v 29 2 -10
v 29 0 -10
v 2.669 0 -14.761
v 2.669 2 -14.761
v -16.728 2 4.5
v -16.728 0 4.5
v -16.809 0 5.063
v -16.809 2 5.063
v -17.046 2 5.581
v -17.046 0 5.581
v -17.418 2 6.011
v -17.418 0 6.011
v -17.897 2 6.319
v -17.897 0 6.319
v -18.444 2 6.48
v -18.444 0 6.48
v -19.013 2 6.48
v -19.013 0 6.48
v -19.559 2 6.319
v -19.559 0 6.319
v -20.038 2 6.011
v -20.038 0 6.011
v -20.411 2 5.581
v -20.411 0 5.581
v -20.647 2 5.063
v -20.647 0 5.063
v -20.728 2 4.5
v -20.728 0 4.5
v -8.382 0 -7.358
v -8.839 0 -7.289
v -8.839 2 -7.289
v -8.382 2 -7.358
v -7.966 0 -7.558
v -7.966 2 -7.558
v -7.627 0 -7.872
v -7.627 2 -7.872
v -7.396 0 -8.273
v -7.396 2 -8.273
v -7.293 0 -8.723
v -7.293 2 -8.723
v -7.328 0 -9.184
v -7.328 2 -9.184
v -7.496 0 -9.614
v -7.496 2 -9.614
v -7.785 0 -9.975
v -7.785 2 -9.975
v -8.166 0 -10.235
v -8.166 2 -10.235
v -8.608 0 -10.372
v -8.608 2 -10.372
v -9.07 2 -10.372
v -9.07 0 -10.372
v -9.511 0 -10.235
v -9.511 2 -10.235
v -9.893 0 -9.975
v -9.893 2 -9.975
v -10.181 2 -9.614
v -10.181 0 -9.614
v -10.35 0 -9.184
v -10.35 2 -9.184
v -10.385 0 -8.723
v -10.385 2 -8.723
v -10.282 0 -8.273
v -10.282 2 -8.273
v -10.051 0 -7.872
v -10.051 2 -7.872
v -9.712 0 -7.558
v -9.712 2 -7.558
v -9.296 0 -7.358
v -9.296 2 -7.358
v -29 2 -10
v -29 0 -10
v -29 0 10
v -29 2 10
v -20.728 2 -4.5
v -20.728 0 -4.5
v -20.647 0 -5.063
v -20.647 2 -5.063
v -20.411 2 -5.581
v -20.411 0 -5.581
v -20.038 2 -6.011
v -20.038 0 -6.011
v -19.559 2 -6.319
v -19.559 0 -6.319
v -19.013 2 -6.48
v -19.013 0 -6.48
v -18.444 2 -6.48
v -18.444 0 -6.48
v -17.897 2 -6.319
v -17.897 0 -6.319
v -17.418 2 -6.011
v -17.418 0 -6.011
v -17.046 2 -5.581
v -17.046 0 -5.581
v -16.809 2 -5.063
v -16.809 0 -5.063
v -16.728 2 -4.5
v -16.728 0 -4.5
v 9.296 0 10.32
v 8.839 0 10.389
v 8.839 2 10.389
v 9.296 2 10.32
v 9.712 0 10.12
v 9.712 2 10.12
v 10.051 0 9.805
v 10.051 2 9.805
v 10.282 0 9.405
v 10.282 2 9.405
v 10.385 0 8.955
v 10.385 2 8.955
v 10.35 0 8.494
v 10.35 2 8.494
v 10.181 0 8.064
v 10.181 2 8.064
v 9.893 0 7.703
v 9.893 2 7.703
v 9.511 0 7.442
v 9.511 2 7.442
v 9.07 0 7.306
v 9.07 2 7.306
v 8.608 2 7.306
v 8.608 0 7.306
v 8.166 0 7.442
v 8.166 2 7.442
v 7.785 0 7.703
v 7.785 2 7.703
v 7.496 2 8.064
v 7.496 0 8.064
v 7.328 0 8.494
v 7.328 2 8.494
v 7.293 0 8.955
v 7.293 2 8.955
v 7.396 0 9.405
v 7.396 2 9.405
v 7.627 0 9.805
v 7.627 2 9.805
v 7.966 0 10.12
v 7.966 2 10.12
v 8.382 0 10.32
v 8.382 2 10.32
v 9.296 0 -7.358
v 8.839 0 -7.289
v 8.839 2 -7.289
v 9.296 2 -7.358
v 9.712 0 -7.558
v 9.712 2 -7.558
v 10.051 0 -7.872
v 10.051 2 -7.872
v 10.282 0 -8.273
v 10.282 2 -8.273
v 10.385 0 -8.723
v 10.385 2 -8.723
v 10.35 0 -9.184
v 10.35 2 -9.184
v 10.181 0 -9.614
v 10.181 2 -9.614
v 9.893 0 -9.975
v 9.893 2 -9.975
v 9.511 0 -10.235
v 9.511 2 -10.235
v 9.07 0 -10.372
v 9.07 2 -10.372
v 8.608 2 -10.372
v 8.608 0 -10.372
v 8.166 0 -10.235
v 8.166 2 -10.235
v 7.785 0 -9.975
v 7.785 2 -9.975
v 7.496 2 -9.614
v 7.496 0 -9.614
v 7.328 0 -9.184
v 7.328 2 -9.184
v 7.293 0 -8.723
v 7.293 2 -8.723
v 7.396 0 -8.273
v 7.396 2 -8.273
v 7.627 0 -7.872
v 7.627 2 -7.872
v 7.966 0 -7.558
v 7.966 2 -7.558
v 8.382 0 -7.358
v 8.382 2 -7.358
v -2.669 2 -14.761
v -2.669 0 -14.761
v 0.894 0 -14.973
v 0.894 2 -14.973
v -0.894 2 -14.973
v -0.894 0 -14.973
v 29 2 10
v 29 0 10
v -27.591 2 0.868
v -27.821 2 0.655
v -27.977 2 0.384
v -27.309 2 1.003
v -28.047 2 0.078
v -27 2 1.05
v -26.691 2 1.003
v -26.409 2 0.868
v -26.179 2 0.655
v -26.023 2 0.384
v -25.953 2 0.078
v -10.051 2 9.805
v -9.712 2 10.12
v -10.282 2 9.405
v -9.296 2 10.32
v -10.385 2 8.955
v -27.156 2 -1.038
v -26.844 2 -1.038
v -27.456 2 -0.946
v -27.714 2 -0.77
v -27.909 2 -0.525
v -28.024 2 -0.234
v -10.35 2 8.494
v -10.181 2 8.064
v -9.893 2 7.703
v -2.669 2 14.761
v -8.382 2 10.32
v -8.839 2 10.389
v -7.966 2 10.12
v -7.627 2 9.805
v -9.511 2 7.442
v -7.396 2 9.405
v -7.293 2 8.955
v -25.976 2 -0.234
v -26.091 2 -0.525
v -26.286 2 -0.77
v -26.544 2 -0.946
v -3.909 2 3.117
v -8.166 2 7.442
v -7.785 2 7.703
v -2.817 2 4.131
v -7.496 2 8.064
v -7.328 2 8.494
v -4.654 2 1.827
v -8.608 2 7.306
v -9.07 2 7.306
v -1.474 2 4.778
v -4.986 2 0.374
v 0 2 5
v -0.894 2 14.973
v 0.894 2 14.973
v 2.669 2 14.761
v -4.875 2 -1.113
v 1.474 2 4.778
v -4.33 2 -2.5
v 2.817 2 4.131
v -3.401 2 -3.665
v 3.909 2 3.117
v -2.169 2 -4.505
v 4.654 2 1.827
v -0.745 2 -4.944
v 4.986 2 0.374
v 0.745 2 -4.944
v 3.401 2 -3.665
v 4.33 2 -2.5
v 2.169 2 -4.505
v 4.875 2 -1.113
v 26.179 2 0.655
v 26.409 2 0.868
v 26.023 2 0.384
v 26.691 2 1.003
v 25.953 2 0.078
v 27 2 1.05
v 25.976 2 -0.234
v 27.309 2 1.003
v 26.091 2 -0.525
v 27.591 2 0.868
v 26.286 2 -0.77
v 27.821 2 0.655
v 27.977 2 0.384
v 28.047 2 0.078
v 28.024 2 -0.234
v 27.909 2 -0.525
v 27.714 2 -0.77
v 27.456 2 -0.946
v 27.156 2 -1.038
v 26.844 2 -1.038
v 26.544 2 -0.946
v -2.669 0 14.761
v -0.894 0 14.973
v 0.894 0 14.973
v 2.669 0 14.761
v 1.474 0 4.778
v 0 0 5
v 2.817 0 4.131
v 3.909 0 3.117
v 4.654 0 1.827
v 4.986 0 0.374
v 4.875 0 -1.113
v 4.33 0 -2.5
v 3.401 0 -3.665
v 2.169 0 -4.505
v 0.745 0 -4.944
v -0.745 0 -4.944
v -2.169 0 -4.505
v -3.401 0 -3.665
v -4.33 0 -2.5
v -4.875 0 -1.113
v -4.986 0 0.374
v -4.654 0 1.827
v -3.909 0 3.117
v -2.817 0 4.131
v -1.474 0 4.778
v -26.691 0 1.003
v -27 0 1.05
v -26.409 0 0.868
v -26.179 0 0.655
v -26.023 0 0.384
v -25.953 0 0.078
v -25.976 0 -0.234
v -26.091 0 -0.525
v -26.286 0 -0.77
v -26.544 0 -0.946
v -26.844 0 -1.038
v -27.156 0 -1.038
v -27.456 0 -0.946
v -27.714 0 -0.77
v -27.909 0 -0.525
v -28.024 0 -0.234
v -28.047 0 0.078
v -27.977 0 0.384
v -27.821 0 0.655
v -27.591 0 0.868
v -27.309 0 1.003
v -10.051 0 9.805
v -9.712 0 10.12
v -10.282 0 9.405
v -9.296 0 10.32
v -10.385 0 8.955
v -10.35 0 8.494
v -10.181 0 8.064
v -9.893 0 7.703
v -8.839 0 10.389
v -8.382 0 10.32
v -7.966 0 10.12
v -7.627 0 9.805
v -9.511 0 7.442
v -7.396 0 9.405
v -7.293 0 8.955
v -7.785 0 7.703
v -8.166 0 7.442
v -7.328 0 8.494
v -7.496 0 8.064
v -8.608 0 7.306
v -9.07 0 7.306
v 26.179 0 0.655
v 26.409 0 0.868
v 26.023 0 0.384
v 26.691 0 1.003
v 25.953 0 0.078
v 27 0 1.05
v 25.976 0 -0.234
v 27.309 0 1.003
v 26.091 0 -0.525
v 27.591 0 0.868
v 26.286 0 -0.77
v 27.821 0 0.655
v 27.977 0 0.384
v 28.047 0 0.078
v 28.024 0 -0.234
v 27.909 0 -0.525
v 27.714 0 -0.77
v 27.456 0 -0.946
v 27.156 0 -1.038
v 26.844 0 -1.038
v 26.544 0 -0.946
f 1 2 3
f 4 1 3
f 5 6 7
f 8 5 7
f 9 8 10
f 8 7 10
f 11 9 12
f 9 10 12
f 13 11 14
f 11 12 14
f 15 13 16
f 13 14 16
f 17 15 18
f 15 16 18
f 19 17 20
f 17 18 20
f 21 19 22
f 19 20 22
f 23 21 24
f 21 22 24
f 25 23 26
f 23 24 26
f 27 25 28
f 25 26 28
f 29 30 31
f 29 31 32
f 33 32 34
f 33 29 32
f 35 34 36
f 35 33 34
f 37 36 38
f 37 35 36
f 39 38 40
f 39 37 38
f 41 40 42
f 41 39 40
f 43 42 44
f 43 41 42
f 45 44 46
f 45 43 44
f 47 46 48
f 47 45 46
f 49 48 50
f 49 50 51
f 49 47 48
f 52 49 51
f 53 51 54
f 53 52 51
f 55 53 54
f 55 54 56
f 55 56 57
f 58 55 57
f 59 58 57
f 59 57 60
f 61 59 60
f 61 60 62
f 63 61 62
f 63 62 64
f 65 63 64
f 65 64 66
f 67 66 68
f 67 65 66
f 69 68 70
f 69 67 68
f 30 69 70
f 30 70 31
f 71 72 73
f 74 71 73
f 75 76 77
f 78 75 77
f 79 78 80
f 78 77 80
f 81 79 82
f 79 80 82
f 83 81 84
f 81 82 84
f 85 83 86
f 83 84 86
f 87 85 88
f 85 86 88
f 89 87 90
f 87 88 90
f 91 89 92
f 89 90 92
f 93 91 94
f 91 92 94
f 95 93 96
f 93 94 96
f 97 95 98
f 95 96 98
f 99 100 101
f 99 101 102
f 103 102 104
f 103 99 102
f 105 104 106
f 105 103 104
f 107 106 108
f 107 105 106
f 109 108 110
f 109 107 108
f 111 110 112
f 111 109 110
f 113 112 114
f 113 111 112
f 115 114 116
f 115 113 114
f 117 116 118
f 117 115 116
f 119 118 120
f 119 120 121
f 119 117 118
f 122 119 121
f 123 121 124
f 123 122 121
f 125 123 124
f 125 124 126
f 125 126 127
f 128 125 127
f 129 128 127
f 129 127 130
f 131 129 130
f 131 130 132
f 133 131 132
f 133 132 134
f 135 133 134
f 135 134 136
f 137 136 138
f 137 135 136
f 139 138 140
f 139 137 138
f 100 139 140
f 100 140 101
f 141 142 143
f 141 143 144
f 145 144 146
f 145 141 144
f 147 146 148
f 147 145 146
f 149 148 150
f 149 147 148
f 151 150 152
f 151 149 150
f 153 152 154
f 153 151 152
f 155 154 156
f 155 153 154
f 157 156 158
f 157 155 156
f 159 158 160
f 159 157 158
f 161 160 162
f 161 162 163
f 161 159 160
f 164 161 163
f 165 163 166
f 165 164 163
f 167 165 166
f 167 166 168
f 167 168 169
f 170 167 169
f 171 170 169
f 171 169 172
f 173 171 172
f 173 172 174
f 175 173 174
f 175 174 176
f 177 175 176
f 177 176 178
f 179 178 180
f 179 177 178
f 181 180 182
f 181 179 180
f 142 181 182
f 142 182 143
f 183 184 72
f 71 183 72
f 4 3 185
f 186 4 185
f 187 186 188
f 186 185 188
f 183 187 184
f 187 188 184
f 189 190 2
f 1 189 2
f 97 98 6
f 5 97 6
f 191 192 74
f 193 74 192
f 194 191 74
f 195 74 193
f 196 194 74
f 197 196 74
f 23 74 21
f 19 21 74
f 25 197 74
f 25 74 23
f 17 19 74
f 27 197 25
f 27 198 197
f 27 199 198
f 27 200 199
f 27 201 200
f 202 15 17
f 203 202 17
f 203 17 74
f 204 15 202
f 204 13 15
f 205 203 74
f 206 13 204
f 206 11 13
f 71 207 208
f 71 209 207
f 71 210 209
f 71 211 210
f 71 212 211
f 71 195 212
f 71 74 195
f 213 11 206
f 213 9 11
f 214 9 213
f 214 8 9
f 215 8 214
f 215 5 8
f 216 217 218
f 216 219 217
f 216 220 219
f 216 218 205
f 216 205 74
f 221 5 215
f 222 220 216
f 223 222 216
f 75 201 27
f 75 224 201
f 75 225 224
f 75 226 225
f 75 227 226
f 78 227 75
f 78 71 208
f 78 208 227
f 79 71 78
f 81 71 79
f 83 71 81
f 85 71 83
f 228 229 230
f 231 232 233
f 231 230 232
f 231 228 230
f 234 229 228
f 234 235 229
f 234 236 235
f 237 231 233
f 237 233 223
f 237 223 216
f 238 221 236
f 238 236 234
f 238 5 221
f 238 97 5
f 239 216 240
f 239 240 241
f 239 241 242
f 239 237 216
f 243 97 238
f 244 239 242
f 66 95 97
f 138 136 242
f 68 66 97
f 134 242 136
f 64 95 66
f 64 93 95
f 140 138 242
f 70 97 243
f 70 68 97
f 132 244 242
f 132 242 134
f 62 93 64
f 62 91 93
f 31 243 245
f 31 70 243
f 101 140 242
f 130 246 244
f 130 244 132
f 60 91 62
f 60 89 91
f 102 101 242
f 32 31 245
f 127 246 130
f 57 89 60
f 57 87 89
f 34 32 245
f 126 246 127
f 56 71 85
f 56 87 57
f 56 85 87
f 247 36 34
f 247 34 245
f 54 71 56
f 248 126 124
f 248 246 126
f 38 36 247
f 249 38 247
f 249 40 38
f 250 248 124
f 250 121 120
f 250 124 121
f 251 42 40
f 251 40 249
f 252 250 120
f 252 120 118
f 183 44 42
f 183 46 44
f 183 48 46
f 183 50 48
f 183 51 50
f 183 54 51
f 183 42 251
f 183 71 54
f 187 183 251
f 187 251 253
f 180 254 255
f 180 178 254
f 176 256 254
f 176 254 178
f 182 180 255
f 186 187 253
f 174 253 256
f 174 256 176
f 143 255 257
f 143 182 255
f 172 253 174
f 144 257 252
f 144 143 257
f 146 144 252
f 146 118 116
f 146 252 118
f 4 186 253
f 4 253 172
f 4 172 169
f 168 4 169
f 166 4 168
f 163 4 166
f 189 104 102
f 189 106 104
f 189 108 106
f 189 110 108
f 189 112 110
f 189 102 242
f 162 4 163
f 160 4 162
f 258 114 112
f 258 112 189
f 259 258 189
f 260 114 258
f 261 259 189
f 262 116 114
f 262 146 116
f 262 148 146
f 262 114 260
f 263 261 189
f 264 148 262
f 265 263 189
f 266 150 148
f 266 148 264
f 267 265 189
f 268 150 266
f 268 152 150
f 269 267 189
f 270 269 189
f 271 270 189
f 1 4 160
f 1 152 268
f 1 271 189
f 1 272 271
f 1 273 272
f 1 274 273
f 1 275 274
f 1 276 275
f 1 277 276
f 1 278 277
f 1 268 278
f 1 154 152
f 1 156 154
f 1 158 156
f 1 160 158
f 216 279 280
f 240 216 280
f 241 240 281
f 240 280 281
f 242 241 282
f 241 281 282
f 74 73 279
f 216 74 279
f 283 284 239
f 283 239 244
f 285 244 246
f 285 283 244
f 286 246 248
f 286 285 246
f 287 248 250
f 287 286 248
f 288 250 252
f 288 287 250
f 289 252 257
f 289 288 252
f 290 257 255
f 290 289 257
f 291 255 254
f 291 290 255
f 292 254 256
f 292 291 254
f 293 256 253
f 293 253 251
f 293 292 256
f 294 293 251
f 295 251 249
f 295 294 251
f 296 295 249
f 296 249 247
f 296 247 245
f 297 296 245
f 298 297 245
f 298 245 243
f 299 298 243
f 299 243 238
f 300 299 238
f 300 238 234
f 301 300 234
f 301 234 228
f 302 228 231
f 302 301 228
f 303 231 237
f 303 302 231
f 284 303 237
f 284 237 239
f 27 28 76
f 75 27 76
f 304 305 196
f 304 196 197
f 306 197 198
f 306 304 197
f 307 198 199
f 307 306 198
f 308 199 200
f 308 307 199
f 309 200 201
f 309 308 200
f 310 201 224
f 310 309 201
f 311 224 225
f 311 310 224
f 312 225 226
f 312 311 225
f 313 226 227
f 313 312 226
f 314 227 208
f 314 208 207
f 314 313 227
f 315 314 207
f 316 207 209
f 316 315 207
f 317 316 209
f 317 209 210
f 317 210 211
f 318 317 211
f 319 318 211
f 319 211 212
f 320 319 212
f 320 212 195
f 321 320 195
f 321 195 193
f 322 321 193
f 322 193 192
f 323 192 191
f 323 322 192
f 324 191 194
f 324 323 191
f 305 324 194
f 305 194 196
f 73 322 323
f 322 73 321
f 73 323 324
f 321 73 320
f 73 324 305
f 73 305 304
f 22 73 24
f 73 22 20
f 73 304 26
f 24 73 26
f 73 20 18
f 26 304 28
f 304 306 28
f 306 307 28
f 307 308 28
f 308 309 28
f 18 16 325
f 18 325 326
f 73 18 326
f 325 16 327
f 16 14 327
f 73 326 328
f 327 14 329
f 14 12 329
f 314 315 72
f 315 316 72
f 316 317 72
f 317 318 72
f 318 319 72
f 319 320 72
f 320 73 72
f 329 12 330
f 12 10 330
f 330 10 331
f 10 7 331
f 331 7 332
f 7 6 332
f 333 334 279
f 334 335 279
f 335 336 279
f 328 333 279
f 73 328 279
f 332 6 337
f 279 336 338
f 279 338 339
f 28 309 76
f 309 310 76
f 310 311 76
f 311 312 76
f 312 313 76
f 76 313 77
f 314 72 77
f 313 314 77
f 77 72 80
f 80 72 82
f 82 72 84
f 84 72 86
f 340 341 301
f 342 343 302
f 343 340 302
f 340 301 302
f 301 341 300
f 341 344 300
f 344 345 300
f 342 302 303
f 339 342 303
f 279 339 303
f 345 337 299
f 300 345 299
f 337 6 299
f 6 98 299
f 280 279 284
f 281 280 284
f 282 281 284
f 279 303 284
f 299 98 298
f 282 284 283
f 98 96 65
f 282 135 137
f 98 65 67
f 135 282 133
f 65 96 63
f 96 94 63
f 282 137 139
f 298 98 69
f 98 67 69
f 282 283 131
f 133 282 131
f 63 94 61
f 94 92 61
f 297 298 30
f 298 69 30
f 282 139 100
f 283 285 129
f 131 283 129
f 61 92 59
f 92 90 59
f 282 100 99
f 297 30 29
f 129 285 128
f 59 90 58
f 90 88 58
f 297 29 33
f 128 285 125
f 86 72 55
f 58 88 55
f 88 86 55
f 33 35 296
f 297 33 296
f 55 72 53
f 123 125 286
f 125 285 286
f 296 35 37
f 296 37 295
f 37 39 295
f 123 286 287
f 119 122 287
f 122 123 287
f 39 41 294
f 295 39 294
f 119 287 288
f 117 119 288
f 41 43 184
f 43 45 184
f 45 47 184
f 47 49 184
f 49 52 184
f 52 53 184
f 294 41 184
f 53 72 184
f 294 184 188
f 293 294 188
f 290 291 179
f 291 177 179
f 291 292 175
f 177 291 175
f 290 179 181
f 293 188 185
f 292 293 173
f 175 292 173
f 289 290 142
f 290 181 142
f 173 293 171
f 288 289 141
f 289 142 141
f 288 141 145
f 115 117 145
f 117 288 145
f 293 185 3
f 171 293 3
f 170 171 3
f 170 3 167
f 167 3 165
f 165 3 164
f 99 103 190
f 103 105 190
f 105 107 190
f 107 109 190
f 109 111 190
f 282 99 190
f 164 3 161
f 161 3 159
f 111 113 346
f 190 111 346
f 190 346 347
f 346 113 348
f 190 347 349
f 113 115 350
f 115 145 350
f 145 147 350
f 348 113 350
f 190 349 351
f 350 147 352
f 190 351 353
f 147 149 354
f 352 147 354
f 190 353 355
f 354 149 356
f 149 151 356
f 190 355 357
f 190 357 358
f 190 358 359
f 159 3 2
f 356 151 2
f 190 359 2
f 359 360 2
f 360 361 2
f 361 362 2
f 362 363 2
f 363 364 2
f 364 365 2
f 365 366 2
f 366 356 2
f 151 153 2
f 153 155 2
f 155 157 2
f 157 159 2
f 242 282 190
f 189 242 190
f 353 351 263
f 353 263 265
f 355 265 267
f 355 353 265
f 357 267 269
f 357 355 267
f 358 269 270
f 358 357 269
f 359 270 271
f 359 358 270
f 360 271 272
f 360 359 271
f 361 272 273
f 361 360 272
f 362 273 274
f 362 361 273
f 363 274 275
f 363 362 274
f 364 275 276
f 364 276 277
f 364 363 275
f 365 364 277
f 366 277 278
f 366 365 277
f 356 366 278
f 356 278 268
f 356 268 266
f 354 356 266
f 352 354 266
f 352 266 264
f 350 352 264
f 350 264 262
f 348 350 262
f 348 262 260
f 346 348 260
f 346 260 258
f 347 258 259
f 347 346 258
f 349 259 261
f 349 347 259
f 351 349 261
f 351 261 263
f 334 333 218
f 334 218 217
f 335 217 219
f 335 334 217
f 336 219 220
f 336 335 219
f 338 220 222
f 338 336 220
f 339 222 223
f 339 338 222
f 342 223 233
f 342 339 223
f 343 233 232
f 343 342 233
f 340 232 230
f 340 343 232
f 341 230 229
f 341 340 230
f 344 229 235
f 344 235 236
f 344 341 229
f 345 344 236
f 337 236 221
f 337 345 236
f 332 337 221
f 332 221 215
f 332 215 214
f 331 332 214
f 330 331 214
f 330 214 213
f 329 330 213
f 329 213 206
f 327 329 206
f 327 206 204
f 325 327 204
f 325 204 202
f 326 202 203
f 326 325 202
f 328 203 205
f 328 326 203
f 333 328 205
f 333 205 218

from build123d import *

# Parameters (mm, degrees)
SKETCH1_R           = 5
SKETCH1_R_2         = 1.05
SKETCH1_R_3         = 1.55
BOSS_EXTRUDE1_DEPTH = 2


with BuildPart() as part:
    # Sketch1 → Boss-Extrude1 (new body)
    with BuildSketch(Plane(origin=(0, 0, 0), x_dir=(1, 0, 0), z_dir=(0, 1, 0))):
        with BuildLine():
            Line((-2.668728536, 14.760687247), (-29, 10))
            Line((-29, 10), (-29, -10))
            Line((-29, -10), (-2.668728536, -14.760687247))
            ThreePointArc((-2.668728536, -14.760687247), (0, -15), (2.668728536, -14.760687247))
            Line((2.668728536, -14.760687247), (29, -10))
            Line((29, -10), (29, 10))
            Line((29, 10), (2.668728536, 14.760687247))
            ThreePointArc((2.668728536, 14.760687247), (0, 15), (-2.668728536, 14.760687247))
        make_face()
        with Locations(Location((0, 0, 0), (0, 0, 270))):
            Circle(SKETCH1_R, mode=Mode.SUBTRACT)
        with Locations(Location((-27, 0, 0), (0, 0, 270))):
            Circle(SKETCH1_R_2, mode=Mode.SUBTRACT)
        with Locations(Location((27, 0, 0), (0, 0, 270))):
            Circle(SKETCH1_R_2, mode=Mode.SUBTRACT)
        with Locations(Location((8.838834765, 8.838834765, 0), (0, 0, 270))):
            Circle(SKETCH1_R_3, mode=Mode.SUBTRACT)
        with Locations(Location((8.838834765, -8.838834765, 0), (0, 0, 270))):
            Circle(SKETCH1_R_3, mode=Mode.SUBTRACT)
        with Locations(Location((-8.838834765, -8.838834765, 0), (0, 0, 270))):
            Circle(SKETCH1_R_3, mode=Mode.SUBTRACT)
        with Locations(Location((-8.838834765, 8.838834765, 0), (0, 0, 270))):
            Circle(SKETCH1_R_3, mode=Mode.SUBTRACT)
        with BuildLine():
            Line((-20.728140636, -4.5), (-20.728140636, 4.5))
            ThreePointArc((-20.728140636, 4.5), (-18.728140636, 6.5), (-16.728140636, 4.5))
            Line((-16.728140636, 4.5), (-16.728140636, -4.5))
            ThreePointArc((-16.728140636, -4.5), (-18.728140636, -6.5), (-20.728140636, -4.5))
        make_face(mode=Mode.SUBTRACT)
    extrude(amount=BOSS_EXTRUDE1_DEPTH)


solid = part.part
